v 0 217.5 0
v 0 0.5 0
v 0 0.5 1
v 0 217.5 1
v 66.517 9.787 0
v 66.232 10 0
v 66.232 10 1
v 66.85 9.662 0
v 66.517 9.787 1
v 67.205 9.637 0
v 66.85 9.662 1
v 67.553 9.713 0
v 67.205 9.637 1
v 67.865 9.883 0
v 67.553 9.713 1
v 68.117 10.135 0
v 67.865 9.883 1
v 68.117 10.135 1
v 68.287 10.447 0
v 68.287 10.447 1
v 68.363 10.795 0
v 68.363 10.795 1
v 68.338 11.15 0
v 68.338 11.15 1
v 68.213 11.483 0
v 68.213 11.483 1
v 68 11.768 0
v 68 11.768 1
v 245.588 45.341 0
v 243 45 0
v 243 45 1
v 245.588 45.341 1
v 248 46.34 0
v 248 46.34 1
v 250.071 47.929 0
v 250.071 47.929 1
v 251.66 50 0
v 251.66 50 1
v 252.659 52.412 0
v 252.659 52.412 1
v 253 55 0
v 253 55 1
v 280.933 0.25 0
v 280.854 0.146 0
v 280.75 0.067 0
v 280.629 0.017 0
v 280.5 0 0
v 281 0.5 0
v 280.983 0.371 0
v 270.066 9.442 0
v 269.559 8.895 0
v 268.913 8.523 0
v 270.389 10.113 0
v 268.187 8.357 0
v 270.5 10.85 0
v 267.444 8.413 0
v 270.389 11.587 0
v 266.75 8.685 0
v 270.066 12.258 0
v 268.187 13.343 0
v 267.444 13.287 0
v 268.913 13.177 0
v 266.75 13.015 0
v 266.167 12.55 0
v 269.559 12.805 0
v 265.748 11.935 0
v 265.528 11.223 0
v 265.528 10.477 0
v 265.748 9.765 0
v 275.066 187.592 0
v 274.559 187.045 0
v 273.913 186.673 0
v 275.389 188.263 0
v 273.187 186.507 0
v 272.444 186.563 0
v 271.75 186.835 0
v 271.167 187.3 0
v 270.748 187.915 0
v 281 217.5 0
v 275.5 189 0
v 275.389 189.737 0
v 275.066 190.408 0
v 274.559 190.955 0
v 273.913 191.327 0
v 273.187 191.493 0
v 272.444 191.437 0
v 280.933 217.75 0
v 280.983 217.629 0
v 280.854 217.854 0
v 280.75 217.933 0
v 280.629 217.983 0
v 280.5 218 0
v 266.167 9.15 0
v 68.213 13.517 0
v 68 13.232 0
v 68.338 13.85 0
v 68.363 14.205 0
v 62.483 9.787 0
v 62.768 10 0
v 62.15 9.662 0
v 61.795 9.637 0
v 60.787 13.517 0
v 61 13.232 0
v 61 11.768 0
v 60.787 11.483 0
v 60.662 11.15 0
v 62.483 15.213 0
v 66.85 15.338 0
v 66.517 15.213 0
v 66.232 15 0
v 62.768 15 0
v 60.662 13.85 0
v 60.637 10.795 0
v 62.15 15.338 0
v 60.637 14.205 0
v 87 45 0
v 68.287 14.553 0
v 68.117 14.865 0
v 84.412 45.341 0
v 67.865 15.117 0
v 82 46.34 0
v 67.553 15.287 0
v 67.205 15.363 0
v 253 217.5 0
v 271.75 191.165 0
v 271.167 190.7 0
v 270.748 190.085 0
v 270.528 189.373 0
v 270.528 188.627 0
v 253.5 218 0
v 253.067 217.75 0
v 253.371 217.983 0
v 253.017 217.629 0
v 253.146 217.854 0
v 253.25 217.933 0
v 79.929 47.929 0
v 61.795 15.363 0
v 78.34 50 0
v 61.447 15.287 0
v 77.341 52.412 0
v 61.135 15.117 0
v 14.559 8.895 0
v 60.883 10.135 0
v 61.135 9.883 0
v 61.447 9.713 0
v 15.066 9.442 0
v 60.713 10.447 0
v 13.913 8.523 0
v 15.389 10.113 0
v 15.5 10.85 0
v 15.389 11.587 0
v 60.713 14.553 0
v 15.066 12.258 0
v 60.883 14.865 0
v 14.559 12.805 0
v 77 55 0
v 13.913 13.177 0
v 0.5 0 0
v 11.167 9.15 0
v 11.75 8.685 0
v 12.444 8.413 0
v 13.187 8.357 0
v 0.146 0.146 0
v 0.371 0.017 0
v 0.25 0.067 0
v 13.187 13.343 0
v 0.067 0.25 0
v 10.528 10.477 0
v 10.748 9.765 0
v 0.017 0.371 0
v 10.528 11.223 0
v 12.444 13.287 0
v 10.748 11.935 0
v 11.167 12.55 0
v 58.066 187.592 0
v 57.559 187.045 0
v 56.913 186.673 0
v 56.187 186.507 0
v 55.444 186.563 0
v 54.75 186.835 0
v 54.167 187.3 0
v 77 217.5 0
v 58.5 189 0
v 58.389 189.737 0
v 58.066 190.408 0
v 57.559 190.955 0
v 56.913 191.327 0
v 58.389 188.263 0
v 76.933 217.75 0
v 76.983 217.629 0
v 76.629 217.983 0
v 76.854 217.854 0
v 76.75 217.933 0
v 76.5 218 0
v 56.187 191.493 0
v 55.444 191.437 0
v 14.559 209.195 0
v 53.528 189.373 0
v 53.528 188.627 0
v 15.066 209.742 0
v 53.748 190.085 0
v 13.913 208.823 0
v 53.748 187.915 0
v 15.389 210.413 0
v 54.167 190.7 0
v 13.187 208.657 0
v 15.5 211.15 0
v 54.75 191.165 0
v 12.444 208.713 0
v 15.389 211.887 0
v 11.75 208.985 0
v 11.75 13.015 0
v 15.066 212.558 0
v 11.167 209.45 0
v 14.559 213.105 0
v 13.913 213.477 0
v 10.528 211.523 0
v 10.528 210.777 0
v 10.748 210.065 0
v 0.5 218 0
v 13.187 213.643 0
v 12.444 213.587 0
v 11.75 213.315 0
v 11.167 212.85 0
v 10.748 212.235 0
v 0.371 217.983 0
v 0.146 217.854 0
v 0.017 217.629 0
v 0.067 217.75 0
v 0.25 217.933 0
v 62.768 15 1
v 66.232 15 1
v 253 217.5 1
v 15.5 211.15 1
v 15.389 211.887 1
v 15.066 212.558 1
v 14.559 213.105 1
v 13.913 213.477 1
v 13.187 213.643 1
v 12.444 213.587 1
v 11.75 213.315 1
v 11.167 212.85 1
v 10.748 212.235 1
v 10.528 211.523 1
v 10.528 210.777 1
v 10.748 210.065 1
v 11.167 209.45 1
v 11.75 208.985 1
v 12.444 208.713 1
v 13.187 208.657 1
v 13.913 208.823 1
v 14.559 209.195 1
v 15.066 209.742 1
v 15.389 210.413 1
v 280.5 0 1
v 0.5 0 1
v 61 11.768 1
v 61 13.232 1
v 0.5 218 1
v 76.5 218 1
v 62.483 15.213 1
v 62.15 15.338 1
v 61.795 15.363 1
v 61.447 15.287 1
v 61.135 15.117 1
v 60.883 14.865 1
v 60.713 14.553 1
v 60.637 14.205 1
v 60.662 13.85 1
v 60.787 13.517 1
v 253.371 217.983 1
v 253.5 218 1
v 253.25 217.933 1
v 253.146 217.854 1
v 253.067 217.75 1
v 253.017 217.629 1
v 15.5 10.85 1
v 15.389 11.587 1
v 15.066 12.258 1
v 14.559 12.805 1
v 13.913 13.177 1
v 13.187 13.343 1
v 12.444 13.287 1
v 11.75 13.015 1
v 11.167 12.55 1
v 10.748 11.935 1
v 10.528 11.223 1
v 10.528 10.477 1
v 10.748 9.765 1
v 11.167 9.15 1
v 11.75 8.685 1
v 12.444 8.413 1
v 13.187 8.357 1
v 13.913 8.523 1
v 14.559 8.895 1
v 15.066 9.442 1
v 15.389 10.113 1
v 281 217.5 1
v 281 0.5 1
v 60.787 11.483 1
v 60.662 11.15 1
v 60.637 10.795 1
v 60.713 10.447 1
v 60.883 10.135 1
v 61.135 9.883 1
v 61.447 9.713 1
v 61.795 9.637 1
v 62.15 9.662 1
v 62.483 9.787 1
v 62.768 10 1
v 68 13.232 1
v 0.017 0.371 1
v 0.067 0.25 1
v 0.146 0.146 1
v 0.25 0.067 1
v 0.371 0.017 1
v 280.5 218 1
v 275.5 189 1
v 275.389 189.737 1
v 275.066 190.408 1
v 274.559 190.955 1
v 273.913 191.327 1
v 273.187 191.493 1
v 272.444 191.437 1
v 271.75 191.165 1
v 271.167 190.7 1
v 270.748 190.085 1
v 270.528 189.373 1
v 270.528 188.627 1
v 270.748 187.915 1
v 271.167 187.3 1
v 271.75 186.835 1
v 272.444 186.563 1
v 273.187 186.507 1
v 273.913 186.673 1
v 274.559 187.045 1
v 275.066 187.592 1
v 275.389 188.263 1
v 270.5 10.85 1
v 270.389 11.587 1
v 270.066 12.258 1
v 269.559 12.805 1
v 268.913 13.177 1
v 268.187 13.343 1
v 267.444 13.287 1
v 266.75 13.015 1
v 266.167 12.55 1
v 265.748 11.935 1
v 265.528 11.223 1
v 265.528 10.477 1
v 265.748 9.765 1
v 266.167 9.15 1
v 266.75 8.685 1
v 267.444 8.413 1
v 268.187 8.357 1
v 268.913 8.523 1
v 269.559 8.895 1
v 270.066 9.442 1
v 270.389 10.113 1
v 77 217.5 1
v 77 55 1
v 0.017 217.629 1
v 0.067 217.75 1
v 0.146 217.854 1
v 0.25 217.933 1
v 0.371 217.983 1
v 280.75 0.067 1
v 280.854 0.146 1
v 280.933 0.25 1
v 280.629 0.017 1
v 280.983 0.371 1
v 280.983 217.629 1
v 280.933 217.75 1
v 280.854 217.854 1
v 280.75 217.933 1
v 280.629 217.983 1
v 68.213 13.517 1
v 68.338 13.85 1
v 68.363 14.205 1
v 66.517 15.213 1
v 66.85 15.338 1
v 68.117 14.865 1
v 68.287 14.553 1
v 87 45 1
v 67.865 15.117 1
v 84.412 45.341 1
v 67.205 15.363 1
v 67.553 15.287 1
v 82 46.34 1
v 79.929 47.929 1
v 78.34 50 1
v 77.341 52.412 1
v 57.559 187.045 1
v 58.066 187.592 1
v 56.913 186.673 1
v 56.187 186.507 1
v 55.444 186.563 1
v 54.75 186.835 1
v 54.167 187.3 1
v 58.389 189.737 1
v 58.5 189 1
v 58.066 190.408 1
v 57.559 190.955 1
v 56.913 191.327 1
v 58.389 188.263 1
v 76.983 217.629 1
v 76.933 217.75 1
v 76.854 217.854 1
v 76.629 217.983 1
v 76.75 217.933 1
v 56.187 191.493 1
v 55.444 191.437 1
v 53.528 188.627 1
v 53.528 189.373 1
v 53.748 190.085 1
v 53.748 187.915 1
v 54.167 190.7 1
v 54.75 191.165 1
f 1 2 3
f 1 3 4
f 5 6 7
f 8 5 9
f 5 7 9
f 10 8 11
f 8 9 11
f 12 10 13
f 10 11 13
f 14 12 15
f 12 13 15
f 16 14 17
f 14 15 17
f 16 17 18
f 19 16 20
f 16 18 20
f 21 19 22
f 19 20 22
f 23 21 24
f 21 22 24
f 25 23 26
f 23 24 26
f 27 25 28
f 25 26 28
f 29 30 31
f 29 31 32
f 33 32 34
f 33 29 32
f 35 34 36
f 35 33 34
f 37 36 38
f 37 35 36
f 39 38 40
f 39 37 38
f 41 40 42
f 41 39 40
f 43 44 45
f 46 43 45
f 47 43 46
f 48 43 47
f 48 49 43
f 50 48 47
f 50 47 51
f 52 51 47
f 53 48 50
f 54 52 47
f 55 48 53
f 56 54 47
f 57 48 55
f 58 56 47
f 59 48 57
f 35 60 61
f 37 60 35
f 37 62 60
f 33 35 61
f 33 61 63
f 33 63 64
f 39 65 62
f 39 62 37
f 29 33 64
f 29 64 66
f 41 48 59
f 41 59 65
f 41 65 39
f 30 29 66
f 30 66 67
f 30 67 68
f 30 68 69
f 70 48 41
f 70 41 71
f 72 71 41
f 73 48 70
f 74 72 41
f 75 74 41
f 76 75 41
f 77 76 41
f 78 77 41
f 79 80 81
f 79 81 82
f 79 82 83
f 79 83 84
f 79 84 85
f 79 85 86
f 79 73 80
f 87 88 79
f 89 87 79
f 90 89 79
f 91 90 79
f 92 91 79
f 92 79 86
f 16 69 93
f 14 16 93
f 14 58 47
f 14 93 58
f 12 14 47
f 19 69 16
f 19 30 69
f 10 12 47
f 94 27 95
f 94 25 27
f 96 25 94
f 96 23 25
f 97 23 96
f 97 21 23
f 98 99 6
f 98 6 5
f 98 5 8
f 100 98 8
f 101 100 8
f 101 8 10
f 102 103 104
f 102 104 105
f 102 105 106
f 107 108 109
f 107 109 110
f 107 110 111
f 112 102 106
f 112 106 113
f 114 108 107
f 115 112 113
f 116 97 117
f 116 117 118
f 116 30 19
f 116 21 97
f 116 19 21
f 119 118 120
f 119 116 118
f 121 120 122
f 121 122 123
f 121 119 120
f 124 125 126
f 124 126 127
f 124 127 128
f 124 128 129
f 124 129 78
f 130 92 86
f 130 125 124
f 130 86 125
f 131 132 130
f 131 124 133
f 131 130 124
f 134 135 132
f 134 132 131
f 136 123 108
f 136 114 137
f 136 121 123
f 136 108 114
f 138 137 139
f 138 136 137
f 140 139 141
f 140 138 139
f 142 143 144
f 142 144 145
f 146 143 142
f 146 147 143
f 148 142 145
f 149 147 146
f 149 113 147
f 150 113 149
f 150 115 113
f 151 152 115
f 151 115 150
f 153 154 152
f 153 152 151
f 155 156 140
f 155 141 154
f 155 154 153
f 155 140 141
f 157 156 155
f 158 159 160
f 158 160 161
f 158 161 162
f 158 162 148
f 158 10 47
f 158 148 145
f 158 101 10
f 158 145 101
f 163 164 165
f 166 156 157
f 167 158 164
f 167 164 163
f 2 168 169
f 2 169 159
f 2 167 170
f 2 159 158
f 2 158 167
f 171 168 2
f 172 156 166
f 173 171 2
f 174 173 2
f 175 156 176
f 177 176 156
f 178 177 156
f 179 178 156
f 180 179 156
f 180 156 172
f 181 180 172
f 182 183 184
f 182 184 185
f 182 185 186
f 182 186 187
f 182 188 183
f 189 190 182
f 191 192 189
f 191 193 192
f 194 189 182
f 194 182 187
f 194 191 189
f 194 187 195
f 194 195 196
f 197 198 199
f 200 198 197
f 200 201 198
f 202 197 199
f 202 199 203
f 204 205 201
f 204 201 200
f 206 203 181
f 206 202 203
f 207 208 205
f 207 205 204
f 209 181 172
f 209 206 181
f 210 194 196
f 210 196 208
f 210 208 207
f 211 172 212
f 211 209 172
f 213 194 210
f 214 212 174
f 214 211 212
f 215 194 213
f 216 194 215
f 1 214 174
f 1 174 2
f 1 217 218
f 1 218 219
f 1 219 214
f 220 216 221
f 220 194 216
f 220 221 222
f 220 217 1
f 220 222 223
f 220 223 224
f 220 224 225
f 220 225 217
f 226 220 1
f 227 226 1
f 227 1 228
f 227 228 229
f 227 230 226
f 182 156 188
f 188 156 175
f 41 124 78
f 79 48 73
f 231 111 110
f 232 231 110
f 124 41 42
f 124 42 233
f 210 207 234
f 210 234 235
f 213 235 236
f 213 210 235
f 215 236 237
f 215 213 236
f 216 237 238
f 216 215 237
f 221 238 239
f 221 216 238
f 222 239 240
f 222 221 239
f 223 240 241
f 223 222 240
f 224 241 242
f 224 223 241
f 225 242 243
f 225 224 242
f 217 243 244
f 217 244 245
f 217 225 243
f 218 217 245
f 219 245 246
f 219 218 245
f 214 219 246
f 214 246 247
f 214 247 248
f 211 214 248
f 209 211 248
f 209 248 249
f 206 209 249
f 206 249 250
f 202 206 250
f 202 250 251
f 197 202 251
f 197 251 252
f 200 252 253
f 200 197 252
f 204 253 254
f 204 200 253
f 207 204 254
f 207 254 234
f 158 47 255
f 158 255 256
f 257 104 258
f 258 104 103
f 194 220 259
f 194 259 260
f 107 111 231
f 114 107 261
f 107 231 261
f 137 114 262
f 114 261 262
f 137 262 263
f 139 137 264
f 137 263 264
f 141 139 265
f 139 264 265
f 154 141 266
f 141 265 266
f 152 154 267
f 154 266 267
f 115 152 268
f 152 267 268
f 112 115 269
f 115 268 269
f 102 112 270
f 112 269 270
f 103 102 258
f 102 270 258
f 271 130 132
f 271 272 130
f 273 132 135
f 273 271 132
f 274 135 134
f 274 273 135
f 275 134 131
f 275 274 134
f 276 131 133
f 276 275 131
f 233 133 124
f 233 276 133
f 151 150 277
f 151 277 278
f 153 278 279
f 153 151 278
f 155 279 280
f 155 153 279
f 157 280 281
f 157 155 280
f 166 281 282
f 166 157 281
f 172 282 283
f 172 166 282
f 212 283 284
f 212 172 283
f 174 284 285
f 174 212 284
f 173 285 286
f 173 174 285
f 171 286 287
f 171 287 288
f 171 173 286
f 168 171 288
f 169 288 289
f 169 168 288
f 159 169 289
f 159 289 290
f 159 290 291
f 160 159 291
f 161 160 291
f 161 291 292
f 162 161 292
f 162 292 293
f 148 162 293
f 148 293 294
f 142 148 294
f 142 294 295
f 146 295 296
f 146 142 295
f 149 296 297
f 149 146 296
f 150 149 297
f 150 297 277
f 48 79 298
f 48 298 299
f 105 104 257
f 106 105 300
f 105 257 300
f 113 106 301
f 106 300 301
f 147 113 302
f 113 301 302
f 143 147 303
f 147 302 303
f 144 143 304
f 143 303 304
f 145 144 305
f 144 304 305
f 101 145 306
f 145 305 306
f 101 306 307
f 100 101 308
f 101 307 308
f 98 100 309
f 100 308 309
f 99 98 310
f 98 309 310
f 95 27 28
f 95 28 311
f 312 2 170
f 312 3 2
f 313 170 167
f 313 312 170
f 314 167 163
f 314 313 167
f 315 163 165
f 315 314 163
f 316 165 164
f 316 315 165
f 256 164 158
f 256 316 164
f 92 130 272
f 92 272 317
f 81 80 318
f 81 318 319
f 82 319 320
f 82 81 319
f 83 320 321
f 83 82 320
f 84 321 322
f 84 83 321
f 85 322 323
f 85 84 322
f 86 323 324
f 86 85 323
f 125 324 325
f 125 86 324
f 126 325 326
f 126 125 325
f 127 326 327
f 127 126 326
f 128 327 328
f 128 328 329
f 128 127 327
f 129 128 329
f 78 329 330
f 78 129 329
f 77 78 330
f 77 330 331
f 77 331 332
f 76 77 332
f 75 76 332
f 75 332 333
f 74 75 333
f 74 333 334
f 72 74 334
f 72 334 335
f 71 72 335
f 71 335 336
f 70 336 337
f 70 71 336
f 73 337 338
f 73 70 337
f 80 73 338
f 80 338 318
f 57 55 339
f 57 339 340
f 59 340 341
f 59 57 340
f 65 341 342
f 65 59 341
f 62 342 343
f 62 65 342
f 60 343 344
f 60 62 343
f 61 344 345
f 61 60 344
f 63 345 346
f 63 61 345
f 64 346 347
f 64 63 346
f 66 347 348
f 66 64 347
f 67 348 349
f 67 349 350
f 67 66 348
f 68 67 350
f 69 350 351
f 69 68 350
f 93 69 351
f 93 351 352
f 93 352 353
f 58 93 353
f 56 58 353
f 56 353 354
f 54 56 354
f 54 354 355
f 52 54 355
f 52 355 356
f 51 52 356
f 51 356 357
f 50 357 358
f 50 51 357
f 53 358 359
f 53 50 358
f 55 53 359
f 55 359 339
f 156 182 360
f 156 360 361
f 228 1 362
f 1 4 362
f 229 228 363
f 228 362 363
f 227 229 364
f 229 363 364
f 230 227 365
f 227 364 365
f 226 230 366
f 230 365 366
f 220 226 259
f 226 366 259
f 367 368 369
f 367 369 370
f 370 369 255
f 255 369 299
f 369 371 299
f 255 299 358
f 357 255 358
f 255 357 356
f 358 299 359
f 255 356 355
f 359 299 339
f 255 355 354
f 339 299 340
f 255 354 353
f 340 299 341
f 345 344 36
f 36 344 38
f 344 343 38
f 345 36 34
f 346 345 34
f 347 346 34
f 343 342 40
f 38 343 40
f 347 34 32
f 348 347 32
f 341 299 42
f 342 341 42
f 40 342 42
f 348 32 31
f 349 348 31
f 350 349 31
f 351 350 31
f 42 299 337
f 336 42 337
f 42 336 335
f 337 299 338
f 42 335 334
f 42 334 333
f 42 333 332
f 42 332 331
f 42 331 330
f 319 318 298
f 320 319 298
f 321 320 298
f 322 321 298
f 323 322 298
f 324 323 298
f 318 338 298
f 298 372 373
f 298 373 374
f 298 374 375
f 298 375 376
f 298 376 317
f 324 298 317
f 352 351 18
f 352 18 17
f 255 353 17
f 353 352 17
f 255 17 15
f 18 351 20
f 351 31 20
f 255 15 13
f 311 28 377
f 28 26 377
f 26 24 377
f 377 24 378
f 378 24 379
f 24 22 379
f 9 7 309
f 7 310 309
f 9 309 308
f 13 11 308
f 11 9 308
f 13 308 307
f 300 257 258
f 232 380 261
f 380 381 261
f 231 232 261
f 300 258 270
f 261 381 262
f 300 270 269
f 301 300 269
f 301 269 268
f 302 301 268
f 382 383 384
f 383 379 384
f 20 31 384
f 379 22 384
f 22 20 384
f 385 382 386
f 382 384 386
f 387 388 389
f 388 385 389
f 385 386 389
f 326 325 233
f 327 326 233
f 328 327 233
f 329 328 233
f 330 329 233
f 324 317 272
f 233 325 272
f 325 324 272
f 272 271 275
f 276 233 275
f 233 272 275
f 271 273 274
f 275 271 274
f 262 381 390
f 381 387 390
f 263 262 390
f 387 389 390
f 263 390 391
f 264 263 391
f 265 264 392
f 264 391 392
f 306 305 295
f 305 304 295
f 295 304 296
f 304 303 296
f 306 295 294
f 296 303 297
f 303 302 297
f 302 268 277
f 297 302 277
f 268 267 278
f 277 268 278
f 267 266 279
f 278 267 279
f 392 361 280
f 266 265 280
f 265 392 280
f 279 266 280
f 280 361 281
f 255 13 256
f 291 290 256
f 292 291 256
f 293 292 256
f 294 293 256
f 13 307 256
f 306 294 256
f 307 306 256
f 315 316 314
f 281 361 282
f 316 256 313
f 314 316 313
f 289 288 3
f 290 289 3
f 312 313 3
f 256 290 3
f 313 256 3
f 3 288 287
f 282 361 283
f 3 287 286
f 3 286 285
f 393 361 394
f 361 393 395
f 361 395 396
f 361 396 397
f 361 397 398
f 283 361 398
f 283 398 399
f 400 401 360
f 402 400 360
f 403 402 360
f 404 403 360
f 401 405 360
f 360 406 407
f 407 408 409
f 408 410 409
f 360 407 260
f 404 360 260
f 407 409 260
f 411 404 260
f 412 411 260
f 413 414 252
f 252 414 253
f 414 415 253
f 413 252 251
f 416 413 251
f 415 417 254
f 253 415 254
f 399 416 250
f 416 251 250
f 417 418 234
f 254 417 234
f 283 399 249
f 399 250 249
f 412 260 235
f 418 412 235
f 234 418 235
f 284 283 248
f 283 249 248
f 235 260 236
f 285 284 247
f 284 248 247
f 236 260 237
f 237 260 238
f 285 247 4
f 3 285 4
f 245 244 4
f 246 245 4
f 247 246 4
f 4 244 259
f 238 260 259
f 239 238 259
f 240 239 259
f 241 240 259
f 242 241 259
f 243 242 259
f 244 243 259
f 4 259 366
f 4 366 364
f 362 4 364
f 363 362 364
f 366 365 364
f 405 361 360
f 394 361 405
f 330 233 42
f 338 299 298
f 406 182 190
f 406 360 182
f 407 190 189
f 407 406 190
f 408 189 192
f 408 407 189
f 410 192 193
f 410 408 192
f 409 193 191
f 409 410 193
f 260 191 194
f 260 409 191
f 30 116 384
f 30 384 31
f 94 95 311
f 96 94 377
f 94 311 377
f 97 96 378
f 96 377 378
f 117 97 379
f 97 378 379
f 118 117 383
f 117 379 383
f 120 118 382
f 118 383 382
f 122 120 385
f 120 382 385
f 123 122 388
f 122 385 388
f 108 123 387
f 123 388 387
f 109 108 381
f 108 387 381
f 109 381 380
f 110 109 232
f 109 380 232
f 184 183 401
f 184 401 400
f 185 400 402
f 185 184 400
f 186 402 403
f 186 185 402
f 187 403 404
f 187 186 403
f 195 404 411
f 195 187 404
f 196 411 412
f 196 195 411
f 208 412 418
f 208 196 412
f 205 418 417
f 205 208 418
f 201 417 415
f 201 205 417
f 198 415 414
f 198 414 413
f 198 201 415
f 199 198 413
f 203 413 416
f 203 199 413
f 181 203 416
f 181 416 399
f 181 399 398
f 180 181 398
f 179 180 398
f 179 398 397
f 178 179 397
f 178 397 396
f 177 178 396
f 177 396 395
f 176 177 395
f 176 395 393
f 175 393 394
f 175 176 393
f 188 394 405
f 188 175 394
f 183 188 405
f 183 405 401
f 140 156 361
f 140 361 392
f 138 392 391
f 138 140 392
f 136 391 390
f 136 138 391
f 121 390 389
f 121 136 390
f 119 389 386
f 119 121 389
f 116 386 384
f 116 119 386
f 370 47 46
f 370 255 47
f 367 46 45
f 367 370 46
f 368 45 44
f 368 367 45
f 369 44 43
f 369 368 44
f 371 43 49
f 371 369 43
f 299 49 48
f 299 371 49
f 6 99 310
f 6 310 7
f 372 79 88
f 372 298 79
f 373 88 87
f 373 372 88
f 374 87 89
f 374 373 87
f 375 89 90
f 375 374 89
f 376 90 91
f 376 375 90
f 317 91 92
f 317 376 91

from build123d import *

# Parameters (mm, degrees)
SKETCH1_R                     = 2.5
SKETCH1_W                     = 7
SKETCH1_H                     = 5
F_1MM_STAINLESS_STEAL_DEPTH   = 1
SKETCH3_R                     = 1.25
CUT_EXTRUDE2_DEPTH            = 356.648703077
FILLET2_1MM_STAINLESS_STEAL_R = 0.5


with BuildPart() as part:
    # Sketch1 → 1mm Stainless_Steal (new body)
    with BuildSketch(Plane.XY):
        with BuildLine():
            Line((77, 218), (77, 55))
            ThreePointArc((77, 55), (79.928932188, 47.928932188), (87, 45))
            Line((87, 45), (243, 45))
            ThreePointArc((243, 45), (250.071067812, 47.928932188), (253, 55))
            Line((253, 55), (253, 218))
            Line((253, 218), (281, 218))
            Line((281, 218), (281, 0))
            Line((281, 0), (0, 0))
            Line((0, 0), (0, 218))
            Line((0, 218), (77, 218))
        make_face()
        with Locations((13, 10.85)):
            Circle(SKETCH1_R, mode=Mode.SUBTRACT)
        with Locations((13, 211.15)):
            Circle(SKETCH1_R, mode=Mode.SUBTRACT)
        with Locations((56, 189)):
            Circle(SKETCH1_R, mode=Mode.SUBTRACT)
        with Locations((268, 10.85)):
            Circle(SKETCH1_R, mode=Mode.SUBTRACT)
        with Locations((273, 189)):
            Circle(SKETCH1_R, mode=Mode.SUBTRACT)
        with Locations((64.5, 12.5)):
            Rectangle(SKETCH1_W, SKETCH1_H, mode=Mode.SUBTRACT)
    extrude(amount=F_1MM_STAINLESS_STEAL_DEPTH)

    # Sketch3 → Cut-Extrude2 (cut, through all)
    with BuildSketch(Plane.XY.offset(1)):
        with Locations((61.883883476, 14.116116524)):
            Circle(SKETCH3_R)
        with Locations((67.116116524, 10.883883476)):
            Circle(SKETCH3_R)
        with Locations((67.116116524, 14.116116524)):
            Circle(SKETCH3_R)
        with Locations((61.883883476, 10.883883476)):
            Circle(SKETCH3_R)
    extrude(amount=-CUT_EXTRUDE2_DEPTH, mode=Mode.SUBTRACT)

    # Fillet2_1mm_Stainless_Steal
    fillet2_1mm_stainless_steal_edges = [part.edges().sort_by_distance(p)[0] for p in [
        (253, 218, 0.5),
        (281, 218, 0.5),
        (281, 0, 0.5),
        (0, 0, 0.5),
        (0, 218, 0.5),
        (77, 218, 0.5),
    ]]
    fillet(fillet2_1mm_stainless_steal_edges, radius=FILLET2_1MM_STAINLESS_STEAL_R)


solid = part.part
